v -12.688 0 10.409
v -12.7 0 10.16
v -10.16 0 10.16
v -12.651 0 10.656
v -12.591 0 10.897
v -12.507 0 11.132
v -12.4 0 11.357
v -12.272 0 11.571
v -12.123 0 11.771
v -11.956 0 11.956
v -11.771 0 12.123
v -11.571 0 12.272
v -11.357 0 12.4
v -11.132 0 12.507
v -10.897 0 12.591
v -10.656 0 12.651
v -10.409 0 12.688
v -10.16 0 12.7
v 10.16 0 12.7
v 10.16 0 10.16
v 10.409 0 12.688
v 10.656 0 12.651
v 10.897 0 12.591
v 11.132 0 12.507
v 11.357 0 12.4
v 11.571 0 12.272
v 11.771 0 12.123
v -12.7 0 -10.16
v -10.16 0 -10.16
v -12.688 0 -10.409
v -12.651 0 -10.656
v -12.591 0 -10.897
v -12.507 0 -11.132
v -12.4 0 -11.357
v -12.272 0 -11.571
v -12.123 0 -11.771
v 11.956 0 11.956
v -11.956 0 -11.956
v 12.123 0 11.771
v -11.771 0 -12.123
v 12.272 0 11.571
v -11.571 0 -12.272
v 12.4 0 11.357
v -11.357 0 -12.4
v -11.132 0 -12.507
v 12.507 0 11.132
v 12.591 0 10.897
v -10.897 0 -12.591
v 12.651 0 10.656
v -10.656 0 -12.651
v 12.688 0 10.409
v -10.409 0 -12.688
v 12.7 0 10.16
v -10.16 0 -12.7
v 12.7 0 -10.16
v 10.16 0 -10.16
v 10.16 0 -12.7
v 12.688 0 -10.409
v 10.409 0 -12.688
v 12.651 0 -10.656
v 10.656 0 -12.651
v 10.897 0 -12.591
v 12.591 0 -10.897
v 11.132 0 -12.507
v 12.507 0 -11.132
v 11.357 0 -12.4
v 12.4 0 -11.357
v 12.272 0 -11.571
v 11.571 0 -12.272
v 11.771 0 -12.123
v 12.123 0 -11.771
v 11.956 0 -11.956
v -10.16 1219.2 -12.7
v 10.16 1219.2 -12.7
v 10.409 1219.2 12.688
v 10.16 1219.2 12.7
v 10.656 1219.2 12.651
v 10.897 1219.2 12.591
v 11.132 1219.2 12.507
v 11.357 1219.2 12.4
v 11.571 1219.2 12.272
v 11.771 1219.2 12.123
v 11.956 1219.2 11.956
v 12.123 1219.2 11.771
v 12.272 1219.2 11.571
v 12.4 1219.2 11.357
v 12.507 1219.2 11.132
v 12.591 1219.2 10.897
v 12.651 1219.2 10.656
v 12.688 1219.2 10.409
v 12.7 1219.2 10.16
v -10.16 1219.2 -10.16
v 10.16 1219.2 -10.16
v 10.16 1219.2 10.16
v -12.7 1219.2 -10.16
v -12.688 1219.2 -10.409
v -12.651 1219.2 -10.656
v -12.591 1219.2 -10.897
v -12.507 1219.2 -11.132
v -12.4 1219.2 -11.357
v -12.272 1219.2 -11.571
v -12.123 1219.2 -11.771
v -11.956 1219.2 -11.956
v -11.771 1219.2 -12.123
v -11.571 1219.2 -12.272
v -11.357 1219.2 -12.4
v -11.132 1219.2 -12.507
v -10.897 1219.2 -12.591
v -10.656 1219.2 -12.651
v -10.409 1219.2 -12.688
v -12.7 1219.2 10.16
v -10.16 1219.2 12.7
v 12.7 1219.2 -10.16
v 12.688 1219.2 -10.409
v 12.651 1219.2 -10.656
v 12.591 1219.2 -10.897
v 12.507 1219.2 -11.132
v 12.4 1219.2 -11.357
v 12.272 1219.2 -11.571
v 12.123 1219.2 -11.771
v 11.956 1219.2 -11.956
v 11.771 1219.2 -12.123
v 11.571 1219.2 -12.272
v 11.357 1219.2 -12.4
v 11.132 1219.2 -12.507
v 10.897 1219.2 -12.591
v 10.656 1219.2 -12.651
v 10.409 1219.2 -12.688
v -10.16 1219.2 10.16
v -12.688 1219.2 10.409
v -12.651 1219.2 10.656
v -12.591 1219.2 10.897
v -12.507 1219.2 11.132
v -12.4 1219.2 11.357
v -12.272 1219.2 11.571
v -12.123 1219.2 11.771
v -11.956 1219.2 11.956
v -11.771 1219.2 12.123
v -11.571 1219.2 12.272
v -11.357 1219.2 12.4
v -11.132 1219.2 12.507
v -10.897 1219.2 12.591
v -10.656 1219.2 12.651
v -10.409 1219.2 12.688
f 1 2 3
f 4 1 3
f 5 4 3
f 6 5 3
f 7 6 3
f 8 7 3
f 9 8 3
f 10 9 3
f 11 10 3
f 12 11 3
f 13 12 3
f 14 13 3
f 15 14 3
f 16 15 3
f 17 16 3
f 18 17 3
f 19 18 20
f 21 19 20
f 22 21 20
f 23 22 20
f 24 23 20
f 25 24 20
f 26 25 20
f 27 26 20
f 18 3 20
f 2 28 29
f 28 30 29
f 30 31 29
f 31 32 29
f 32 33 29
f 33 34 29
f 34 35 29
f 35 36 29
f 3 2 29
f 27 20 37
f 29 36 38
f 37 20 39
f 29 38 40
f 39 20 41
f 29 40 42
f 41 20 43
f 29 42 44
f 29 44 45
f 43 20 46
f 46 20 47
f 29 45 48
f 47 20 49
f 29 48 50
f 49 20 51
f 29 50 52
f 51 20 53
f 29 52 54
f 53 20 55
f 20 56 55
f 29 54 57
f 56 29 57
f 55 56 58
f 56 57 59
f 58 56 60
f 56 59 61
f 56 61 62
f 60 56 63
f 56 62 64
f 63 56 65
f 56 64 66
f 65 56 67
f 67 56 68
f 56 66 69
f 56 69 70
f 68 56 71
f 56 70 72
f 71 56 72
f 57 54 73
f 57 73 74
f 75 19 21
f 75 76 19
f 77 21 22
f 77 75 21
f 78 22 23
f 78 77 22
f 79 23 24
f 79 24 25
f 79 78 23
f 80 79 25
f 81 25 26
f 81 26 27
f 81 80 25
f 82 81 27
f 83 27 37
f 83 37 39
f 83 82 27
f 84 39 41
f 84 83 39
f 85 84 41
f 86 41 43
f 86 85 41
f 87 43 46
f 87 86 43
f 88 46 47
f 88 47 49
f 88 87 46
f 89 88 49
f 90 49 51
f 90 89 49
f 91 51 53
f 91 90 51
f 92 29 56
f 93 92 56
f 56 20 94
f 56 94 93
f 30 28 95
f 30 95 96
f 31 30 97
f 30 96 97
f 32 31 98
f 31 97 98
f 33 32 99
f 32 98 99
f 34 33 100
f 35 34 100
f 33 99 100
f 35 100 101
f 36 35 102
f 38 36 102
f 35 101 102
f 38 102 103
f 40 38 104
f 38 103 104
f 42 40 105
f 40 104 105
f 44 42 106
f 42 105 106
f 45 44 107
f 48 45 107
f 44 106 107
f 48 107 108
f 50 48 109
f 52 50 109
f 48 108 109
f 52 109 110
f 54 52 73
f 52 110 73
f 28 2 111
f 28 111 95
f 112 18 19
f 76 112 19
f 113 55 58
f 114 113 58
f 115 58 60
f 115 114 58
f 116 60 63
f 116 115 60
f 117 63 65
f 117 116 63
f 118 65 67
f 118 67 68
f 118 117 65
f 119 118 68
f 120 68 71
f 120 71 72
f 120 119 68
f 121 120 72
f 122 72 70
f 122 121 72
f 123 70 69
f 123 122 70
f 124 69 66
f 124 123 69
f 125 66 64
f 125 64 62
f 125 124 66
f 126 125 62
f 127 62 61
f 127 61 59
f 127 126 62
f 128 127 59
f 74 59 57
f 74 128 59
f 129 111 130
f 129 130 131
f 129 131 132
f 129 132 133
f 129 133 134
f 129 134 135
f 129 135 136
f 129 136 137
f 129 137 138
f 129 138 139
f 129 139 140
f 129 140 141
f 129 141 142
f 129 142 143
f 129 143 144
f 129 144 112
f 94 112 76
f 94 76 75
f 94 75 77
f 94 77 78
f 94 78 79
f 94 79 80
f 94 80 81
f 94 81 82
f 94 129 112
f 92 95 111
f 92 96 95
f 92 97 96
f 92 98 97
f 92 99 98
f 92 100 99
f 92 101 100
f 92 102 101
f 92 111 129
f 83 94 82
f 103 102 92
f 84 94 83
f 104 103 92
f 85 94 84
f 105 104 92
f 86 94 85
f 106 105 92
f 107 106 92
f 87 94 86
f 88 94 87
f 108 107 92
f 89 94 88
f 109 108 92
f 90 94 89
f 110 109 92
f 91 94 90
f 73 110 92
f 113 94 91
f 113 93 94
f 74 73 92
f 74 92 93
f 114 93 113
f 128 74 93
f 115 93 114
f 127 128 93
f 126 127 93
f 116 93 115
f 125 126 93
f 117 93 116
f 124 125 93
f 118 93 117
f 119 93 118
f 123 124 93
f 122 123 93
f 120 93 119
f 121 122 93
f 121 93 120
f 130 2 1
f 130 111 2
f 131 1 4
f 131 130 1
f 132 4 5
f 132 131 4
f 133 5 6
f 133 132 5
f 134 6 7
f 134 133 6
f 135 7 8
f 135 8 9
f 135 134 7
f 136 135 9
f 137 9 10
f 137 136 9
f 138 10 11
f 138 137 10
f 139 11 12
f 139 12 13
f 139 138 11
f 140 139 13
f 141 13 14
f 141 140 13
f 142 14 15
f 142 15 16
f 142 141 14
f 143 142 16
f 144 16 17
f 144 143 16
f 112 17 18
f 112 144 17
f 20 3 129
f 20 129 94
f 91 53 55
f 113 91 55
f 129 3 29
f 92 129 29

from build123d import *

# Parameters (mm, degrees)
SKETCH4_W           = 25.4
SKETCH4_H           = 25.4
BOSS_EXTRUDE6_DEPTH = 1219.2
SHELL1_T            = -2.54
FILLET1_R           = 2.54


with BuildPart() as part:
    # Sketch4 → Boss-Extrude6 (new body)
    with BuildSketch(Plane(origin=(0, 0, 0), x_dir=(1, 0, 0), z_dir=(0, 1, 0))):
        Rectangle(SKETCH4_W, SKETCH4_H)
    extrude(amount=BOSS_EXTRUDE6_DEPTH)

    # Shell1
    shell1_openings = [part.faces().sort_by_distance(p)[0] for p in [
        (0, 1219.2, 0),
        (0, 0, 0),
    ]]
    offset(amount=SHELL1_T, openings=shell1_openings, kind=Kind.INTERSECTION)

    # Fillet1
    fillet1_edges = [part.edges().sort_by_distance(p)[0] for p in [
        (12.7, 609.6, -12.7),
        (12.7, 609.6, 12.7),
        (-12.7, 609.6, 12.7),
        (-12.7, 609.6, -12.7),
    ]]
    fillet(fillet1_edges, radius=FILLET1_R)


solid = part.part
